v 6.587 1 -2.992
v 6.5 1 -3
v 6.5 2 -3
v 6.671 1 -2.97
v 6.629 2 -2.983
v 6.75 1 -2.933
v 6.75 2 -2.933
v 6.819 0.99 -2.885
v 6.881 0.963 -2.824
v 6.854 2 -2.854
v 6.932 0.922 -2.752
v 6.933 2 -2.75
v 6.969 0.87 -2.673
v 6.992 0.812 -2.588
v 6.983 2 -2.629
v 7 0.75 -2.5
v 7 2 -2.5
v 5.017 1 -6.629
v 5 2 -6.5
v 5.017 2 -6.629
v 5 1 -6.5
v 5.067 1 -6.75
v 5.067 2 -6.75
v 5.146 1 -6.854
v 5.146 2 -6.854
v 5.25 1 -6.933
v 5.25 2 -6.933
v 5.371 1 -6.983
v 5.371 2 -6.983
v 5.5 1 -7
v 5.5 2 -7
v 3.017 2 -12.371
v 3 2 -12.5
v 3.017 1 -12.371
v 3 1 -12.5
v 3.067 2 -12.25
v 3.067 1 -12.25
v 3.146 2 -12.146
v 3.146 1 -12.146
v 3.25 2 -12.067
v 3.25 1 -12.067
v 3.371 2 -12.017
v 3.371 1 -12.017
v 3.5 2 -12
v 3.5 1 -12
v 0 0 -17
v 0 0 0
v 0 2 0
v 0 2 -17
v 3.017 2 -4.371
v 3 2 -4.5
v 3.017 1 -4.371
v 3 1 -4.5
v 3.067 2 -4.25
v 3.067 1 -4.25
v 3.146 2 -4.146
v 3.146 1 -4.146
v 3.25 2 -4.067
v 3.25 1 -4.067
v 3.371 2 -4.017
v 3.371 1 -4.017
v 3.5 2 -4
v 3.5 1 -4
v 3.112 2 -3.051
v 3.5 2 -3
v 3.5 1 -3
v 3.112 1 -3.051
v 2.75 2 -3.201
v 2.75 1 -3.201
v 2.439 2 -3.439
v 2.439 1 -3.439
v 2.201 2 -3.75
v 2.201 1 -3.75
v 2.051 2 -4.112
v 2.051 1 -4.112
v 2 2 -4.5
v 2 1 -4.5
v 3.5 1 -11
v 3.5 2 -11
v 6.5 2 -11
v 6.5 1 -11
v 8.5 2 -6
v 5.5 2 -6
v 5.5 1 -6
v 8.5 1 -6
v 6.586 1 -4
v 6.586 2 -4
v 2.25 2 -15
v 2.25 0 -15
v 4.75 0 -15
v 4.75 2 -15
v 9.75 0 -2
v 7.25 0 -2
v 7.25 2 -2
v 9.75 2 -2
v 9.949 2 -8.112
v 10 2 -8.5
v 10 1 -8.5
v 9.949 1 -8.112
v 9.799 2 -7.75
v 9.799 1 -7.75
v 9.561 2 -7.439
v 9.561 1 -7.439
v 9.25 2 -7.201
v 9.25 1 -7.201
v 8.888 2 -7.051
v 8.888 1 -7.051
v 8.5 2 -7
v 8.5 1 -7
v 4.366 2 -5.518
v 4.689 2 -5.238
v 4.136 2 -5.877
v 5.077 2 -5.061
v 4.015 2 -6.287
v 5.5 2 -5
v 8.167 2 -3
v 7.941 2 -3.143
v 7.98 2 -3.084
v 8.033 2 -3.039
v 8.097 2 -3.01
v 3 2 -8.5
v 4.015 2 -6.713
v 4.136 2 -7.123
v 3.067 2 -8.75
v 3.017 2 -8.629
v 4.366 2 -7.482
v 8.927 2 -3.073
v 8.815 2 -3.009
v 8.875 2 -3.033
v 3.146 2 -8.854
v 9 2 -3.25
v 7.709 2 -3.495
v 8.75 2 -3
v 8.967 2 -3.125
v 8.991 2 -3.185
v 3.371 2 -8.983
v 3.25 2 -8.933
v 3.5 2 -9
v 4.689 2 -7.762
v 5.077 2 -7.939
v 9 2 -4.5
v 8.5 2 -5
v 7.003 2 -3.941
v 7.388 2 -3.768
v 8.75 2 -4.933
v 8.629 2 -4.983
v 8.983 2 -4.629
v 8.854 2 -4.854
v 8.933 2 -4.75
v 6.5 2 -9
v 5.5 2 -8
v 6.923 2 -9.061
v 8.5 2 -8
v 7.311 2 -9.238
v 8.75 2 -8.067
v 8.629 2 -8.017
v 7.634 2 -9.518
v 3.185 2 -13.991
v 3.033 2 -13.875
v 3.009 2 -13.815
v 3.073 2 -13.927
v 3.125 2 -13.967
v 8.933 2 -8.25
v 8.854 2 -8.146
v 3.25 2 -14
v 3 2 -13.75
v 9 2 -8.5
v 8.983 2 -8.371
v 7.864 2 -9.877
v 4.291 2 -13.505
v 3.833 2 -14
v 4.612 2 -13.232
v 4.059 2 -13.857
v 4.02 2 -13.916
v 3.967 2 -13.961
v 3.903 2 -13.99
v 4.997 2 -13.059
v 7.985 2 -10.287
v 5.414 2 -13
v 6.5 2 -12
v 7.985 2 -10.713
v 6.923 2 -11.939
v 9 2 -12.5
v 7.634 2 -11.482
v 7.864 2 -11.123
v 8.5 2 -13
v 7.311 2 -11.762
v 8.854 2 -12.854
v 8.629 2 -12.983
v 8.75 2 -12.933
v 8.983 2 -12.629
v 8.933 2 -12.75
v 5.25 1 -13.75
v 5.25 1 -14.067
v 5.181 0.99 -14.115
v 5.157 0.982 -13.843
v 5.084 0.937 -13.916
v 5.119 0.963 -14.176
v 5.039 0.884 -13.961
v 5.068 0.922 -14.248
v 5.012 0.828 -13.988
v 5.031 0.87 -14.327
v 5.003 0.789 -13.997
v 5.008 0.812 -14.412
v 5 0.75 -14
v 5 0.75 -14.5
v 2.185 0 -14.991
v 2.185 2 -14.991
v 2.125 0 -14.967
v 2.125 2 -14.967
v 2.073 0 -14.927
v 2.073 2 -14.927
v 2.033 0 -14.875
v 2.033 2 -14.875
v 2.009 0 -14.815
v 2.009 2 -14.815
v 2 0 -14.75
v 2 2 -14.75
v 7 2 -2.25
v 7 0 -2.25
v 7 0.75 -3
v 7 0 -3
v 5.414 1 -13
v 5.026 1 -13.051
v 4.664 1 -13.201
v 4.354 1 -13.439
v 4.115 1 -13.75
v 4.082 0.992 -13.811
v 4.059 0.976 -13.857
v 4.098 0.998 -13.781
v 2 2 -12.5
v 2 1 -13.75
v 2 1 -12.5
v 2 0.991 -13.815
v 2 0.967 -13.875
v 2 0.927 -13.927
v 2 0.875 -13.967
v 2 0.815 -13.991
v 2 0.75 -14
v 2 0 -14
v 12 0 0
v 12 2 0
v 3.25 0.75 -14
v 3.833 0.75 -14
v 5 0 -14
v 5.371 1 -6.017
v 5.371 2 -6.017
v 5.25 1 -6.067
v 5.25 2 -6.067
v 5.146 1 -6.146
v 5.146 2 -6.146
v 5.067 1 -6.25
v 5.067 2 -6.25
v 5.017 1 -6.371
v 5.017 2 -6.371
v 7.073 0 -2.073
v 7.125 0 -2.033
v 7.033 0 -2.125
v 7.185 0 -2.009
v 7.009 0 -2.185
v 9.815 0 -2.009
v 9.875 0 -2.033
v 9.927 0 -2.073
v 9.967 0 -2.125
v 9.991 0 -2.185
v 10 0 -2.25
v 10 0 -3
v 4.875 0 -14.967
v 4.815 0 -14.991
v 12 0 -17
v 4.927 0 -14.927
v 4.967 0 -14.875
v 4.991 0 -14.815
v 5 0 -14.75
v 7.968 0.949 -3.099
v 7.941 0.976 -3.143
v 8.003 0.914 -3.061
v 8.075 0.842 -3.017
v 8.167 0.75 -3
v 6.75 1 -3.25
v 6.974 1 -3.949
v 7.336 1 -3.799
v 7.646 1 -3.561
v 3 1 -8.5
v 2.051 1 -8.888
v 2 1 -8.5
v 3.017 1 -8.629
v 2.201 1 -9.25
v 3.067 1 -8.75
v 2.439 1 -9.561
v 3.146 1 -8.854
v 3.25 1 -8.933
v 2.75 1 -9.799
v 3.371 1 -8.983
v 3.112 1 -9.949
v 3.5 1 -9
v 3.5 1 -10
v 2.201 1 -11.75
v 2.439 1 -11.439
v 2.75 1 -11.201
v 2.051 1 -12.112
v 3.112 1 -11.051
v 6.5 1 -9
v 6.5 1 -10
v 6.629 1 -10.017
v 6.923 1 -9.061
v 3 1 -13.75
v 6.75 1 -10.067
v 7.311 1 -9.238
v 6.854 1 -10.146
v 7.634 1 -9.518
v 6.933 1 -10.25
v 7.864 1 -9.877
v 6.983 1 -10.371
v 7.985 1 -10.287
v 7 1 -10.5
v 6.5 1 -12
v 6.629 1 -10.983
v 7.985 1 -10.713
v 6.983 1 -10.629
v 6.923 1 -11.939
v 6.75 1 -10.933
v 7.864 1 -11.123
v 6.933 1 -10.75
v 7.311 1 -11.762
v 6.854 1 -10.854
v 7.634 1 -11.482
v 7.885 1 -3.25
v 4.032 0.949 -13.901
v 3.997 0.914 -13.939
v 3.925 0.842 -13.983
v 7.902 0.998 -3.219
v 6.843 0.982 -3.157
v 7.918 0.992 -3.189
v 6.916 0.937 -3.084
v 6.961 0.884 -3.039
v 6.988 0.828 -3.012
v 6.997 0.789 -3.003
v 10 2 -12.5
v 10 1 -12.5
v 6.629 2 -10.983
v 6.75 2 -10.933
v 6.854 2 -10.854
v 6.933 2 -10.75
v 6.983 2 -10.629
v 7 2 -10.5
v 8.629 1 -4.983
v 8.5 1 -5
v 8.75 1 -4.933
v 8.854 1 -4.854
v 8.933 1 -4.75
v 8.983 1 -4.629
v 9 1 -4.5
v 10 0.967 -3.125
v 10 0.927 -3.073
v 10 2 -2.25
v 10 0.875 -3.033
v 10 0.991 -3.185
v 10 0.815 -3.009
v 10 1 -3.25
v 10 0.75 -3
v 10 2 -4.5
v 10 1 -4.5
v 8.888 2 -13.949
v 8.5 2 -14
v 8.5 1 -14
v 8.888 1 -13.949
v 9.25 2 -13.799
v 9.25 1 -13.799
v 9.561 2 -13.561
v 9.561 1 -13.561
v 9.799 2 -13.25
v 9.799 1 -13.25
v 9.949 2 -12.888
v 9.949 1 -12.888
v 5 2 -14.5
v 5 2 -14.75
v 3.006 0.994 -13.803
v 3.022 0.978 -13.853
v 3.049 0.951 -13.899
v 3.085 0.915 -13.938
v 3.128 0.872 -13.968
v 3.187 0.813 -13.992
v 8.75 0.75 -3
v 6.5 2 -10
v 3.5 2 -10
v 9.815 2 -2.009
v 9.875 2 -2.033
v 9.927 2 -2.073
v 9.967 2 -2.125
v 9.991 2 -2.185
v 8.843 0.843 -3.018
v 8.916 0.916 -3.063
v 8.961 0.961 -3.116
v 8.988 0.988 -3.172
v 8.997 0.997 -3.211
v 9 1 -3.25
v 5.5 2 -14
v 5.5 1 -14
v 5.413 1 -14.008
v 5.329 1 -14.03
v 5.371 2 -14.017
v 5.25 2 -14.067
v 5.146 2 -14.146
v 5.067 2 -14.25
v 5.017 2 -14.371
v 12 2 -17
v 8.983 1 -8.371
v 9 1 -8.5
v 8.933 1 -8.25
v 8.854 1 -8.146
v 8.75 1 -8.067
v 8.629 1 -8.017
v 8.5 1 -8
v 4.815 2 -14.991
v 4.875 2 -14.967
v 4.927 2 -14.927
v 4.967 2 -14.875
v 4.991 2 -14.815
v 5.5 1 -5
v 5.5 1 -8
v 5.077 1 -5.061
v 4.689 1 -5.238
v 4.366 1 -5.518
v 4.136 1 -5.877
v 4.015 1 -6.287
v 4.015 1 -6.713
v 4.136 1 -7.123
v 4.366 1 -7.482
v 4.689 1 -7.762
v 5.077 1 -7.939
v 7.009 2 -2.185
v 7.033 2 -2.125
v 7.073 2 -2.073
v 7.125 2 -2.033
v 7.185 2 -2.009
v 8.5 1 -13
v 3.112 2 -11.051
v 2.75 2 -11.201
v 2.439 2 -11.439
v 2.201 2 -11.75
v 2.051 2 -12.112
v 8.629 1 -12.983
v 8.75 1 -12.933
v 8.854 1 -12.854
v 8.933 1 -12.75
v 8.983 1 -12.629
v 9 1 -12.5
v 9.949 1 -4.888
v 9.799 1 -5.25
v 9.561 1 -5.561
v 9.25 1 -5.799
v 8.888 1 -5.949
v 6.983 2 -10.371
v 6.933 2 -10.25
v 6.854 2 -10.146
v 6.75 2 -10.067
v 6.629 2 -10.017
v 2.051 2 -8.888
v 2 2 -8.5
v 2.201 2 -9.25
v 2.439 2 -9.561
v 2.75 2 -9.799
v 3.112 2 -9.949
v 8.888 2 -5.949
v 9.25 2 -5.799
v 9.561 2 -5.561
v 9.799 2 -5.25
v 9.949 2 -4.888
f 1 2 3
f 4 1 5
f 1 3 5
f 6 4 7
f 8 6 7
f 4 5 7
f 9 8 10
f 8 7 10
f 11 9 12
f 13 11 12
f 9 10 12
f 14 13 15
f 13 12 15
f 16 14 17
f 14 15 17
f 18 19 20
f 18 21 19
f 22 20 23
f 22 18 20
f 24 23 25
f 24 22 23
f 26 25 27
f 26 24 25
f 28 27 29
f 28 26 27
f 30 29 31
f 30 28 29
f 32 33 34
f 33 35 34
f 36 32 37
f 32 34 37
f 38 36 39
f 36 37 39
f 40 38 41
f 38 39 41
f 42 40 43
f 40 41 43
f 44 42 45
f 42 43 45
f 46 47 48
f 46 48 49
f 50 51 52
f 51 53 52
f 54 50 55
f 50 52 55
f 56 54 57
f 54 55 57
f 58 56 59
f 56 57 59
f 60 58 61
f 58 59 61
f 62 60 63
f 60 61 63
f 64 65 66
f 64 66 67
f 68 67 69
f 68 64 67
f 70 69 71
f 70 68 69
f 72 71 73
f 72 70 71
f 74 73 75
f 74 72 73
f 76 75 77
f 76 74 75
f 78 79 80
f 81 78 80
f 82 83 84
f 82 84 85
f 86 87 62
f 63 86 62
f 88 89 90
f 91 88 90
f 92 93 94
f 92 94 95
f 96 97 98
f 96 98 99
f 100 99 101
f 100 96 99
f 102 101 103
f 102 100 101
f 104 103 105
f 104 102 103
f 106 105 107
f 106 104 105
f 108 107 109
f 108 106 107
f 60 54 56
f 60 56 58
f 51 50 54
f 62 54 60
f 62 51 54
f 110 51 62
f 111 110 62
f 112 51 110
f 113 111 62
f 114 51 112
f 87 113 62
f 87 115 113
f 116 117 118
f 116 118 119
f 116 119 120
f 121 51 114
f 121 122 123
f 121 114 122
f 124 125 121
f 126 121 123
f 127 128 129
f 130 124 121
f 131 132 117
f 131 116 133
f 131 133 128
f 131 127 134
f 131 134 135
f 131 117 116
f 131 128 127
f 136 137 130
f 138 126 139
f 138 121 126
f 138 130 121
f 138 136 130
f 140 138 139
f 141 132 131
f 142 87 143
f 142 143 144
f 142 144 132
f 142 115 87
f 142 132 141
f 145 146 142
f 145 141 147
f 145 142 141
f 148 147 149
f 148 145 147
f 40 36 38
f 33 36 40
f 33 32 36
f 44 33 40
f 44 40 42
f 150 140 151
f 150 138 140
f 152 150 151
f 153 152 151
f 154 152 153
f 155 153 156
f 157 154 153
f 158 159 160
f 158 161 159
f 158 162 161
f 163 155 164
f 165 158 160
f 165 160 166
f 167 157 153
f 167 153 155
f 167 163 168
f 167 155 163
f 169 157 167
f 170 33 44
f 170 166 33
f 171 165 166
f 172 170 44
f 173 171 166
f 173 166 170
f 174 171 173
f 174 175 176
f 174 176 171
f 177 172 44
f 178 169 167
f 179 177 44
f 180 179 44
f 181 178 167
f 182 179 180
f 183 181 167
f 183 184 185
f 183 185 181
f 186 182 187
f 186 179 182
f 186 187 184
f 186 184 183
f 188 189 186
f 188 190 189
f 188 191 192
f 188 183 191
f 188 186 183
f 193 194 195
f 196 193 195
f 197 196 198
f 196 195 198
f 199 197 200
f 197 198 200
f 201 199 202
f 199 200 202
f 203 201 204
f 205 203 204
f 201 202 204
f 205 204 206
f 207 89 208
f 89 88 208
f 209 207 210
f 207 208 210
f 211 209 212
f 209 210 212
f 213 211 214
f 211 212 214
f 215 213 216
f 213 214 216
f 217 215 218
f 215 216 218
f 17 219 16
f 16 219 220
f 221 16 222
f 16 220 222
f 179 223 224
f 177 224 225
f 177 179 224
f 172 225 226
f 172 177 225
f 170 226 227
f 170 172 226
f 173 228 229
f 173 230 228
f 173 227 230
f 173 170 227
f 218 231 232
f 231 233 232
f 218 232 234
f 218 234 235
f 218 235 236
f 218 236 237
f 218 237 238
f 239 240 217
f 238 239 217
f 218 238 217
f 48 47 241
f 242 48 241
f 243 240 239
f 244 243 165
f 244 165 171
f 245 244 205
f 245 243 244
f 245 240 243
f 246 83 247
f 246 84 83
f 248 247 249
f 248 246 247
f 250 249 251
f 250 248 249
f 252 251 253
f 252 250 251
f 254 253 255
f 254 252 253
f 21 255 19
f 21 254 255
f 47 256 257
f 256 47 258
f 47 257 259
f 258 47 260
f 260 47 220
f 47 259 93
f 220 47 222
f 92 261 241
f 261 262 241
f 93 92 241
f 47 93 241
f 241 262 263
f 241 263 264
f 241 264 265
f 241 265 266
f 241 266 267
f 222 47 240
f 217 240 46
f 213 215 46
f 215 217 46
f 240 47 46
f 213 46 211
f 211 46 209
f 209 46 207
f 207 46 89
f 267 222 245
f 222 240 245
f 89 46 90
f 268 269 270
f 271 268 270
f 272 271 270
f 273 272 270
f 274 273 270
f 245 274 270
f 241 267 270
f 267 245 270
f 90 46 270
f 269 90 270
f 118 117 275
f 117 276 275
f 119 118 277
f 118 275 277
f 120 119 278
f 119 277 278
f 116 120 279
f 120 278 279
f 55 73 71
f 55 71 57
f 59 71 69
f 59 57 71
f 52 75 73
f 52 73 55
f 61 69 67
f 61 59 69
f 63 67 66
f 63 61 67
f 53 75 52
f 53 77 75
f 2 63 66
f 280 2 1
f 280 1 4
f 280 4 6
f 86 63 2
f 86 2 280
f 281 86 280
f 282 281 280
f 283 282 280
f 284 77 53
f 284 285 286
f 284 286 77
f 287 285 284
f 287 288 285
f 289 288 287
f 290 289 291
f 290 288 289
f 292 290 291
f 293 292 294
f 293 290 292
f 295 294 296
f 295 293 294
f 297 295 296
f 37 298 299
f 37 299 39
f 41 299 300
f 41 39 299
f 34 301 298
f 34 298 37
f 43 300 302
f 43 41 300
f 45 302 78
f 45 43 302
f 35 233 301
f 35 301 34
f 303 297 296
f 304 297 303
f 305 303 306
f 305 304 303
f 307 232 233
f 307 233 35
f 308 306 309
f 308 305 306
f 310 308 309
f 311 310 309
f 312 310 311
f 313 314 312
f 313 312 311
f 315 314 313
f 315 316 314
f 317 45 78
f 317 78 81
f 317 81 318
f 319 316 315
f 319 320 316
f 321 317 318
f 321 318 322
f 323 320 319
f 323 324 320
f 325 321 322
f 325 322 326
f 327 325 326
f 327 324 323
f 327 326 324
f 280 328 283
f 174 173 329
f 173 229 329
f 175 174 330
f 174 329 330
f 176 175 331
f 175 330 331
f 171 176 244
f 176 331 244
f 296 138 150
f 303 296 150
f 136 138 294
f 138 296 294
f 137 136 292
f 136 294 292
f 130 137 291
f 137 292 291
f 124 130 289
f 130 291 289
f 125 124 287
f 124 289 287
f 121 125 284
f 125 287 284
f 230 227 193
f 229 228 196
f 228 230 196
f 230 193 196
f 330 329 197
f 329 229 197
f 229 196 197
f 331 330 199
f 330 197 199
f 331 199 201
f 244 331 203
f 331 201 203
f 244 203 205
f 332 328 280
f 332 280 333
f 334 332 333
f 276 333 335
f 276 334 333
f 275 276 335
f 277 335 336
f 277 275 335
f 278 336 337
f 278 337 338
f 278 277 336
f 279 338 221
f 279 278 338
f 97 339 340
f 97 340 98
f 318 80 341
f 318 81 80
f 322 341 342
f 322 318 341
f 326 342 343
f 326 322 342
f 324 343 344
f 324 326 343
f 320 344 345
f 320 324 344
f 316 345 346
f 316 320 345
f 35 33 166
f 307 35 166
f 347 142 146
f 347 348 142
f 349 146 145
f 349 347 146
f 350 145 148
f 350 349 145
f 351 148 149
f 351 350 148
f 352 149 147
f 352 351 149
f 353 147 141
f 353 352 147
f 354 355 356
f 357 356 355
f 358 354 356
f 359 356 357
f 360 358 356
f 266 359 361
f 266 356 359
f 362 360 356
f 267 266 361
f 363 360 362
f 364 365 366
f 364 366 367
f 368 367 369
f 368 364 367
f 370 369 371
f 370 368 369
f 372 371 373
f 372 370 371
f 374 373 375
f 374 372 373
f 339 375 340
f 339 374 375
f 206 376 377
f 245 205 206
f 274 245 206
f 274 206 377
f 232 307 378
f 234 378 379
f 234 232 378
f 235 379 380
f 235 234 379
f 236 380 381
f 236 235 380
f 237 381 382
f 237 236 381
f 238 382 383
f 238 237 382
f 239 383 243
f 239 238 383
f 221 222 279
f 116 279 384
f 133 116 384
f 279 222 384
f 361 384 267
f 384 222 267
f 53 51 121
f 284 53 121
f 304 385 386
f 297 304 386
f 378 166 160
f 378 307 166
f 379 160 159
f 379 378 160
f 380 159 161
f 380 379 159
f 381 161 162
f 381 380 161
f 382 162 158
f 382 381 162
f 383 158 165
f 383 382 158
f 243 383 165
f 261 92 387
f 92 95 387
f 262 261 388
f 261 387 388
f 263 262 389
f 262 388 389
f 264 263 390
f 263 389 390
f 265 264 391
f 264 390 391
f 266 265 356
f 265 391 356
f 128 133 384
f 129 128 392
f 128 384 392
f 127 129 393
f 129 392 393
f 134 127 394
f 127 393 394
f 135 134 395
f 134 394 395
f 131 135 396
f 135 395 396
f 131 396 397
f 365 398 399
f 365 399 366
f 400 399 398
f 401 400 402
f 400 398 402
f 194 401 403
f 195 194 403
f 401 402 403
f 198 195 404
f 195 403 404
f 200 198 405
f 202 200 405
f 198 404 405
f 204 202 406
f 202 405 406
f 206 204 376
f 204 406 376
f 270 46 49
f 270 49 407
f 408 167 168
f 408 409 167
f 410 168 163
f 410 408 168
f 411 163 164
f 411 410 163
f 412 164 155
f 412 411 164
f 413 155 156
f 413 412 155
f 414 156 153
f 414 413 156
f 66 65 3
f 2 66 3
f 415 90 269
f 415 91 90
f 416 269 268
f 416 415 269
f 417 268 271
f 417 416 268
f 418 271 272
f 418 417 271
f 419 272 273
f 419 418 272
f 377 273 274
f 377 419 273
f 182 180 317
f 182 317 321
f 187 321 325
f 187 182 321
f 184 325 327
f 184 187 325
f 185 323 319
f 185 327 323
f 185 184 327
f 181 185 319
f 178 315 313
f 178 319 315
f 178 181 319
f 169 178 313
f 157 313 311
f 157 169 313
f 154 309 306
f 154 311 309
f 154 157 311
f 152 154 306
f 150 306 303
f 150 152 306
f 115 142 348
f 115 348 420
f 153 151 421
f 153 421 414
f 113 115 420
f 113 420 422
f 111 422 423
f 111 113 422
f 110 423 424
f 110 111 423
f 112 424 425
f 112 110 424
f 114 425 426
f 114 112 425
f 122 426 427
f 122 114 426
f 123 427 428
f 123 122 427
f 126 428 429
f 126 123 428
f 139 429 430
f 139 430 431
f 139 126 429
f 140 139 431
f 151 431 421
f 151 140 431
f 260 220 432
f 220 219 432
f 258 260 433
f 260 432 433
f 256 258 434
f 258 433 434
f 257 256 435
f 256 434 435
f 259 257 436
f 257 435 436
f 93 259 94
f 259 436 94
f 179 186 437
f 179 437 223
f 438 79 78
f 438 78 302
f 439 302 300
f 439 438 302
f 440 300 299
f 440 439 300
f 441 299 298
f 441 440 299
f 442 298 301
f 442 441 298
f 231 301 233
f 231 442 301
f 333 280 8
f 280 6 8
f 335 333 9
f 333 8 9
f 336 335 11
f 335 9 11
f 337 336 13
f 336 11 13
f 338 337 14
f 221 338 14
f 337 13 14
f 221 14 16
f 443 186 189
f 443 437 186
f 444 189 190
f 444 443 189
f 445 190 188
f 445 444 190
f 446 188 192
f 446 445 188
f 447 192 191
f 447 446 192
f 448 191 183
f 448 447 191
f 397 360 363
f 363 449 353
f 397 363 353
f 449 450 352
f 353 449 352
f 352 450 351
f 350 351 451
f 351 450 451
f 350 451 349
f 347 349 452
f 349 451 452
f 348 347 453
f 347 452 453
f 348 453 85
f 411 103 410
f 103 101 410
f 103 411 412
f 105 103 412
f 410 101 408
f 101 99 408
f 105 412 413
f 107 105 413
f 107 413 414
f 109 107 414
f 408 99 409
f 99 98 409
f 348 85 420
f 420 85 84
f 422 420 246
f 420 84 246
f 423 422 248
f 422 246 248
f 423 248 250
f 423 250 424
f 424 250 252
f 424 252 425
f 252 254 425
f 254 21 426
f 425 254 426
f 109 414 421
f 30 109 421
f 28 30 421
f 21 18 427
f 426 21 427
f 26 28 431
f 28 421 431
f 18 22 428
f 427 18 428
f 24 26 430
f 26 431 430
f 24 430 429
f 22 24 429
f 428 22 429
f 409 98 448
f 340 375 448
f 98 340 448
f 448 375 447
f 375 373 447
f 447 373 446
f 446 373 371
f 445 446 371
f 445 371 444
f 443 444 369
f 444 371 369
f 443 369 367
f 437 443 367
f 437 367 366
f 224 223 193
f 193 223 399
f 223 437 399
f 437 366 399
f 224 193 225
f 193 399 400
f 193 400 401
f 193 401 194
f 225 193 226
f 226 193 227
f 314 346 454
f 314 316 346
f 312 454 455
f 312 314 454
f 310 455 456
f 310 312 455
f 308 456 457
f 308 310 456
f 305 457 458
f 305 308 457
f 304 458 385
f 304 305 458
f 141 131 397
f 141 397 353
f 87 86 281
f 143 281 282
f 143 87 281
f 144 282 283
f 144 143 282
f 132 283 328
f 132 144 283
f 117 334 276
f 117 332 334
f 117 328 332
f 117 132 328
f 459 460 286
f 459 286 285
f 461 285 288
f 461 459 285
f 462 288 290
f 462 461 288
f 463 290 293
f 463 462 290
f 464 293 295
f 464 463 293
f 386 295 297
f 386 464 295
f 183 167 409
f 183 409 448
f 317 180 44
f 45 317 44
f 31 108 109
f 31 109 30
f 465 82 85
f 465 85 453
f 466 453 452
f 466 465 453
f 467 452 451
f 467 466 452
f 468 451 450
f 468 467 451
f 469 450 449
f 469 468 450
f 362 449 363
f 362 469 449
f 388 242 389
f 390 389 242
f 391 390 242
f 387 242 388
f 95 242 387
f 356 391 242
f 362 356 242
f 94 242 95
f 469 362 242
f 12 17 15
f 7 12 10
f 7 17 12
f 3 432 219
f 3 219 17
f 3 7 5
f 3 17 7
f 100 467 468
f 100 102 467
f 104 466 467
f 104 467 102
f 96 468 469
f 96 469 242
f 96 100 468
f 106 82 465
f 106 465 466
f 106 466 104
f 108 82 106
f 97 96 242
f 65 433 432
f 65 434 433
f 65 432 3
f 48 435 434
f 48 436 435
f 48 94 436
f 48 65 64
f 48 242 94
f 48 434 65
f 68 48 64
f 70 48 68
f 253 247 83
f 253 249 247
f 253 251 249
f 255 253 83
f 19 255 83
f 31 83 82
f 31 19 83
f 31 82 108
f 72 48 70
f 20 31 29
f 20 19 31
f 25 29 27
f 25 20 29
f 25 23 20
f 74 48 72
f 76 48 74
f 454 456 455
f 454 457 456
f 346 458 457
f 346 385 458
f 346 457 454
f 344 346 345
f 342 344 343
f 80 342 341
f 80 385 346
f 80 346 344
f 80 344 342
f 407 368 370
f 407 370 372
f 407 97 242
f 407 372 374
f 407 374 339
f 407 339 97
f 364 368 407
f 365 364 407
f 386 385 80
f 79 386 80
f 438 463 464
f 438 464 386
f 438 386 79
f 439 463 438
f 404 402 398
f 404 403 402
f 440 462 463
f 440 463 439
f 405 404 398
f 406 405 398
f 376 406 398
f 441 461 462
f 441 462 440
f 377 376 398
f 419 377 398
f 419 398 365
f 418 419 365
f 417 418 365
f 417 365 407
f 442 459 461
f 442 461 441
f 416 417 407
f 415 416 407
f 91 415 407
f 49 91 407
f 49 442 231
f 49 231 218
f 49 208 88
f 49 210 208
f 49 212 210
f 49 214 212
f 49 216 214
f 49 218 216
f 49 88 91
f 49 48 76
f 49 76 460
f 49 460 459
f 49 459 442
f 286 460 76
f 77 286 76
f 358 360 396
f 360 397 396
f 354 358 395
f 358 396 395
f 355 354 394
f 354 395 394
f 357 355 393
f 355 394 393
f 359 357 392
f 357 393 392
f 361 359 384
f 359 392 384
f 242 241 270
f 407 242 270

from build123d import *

# Parameters (mm, degrees)
SKIZZE1_W                            = 12
SKIZZE1_H                            = 17
AUFSATZ_LINEAR_AUSTRAGEN1_DEPTH      = 2
SCHNITT_LINEAR_AUSTRAGEN1_DEPTH      = 21.90454496
SCHNITT_LINEAR_AUSTRAGEN1_DEPTH_BACK = 21.90454496
SKIZZE4_W                            = 3
SKIZZE4_H                            = 1
SCHNITT_LINEAR_AUSTRAGEN3_DEPTH      = 1
VERRUNDUNG1_R                        = 0.5
VERRUNDUNG2_R                        = 1.5
VERRUNDUNG3_R                        = 0.25


# Some blends are built 0.0001 mm under size
with BuildPart() as part:
    # Skizze1 → Aufsatz-Linear austragen1 (new body)
    with BuildSketch(Plane(origin=(0, 0, 0), x_dir=(1, 0, 0), z_dir=(0, 1, 0))):
        with Locations((6, 8.5)):
            Rectangle(SKIZZE1_W, SKIZZE1_H)
    extrude(amount=AUFSATZ_LINEAR_AUSTRAGEN1_DEPTH)

    # Skizze4 → Schnitt-Linear austragen1 (cut, two sides: drawn at the far end of the back side and taken through both)
    with BuildSketch(Plane(origin=(0, 2, 0), x_dir=(1, 0, 0), z_dir=(0, 1, 0)).offset(-SCHNITT_LINEAR_AUSTRAGEN1_DEPTH_BACK)):
        with Locations((8.5, 2.5)):
            Rectangle(SKIZZE4_W, SKIZZE4_H)
        with Locations((3.5, 14.5)):
            Rectangle(SKIZZE4_W, SKIZZE4_H)
    extrude(amount=SCHNITT_LINEAR_AUSTRAGEN1_DEPTH + SCHNITT_LINEAR_AUSTRAGEN1_DEPTH_BACK, mode=Mode.SUBTRACT)

    # Skizze3 → Schnitt-Linear austragen3 (cut)
    with BuildSketch(Plane(origin=(0, 2, 0), x_dir=(1, 0, 0), z_dir=(0, 1, 0))):
        Polygon((8, 4), (3, 4), (3, 9), (8, 9), (8, 12), (3, 12), (3, 14), (2, 14), (2, 11), (7, 11), (7, 10), (2, 10), (2, 3), (8, 3), align=None)
        Polygon((9, 5), (4, 5), (4, 8), (9, 8), (9, 13), (4, 13), (4, 14), (10, 14), (10, 7), (5, 7), (5, 6), (10, 6), (10, 3), (9, 3), align=None)
    extrude(amount=-SCHNITT_LINEAR_AUSTRAGEN3_DEPTH, mode=Mode.SUBTRACT)

    # Verrundung1
    verrundung1_edges = [part.edges().sort_by_distance(p)[0] for p in [
        (3, 1.5, -12),
        (3, 1.5, -9),
        (7, 1.5, -3),
        (5, 1.5, -14),
        (9, 1.5, -5),
        (9, 1.5, -8),
        (9, 1.5, -13),
        (5, 1.5, -7),
        (5, 1.5, -6),
        (3, 1.5, -4),
        (7, 1.5, -10),
        (7, 1.5, -11),
    ]]
    fillet(verrundung1_edges, radius=VERRUNDUNG1_R - 0.0001)  # a hair under: the kernel refuses the full size

    # Verrundung2
    # the kernel refuses this fillet: 1.5 mm, written as the material it adds along each edge
    with BuildSketch(Plane(origin=(4, 2, -8), x_dir=(0, 0, 1), z_dir=(0, -1, 0)), Plane(origin=(2, 2, -11), x_dir=(1, 0, 0), z_dir=(0, -1, 0)), Plane(origin=(2, 2, -3), x_dir=(1, 0, 0), z_dir=(0, -1, 0)), Plane(origin=(2, 2, -10), x_dir=(0, 0, 1), z_dir=(0, -1, 0)), Plane(origin=(4, 2, -5), x_dir=(1, 0, 0), z_dir=(0, -1, 0))) as verrundung2_piece_1:
        with BuildLine():
            CenterArc((VERRUNDUNG2_R, -VERRUNDUNG2_R), VERRUNDUNG2_R, 90, 90)
            Line((0, -VERRUNDUNG2_R), (-VERRUNDUNG2_R * 0.02, -VERRUNDUNG2_R))
            Line((-VERRUNDUNG2_R * 0.02, -VERRUNDUNG2_R), (-VERRUNDUNG2_R * 0.02, VERRUNDUNG2_R * 0.02))
            Line((-VERRUNDUNG2_R * 0.02, VERRUNDUNG2_R * 0.02), (VERRUNDUNG2_R, VERRUNDUNG2_R * 0.02))
            Line((VERRUNDUNG2_R, VERRUNDUNG2_R * 0.02), (VERRUNDUNG2_R, 0))
        make_face()
    extrude(amount=1)
    with BuildSketch(Plane(origin=(8, 2, -4), x_dir=(-1, 0, 0), z_dir=(0, -1, 0)), Plane(origin=(4, 2, -13), x_dir=(1, 0, 0), z_dir=(0, -1, 0))) as verrundung2_piece_2:
        with BuildLine():
            CenterArc((1.414213562, -1.5), VERRUNDUNG2_R, 90, 70.528779366)
            Line((0, -1), (-0.028284271, -0.99))
            ThreePointArc((-0.028284271, -0.99), (-0.03, -0.5), (-0.03, 0))
            Line((-0.03, 0), (0, 0.03))
            Line((0, 0.03), (1.414213562, 0.03))
            Line((1.414213562, 0.03), (1.414213562, 0))
        make_face()
    extrude(amount=1)
    with BuildSketch(Plane(origin=(10, 2, -14), x_dir=(0, 0, 1), z_dir=(0, -1, 0)), Plane(origin=(10, 2, -7), x_dir=(-1, 0, 0), z_dir=(0, -1, 0)), Plane(origin=(10, 2, -6), x_dir=(0, 0, 1), z_dir=(0, -1, 0)), Plane(origin=(8, 2, -12), x_dir=(0, 0, 1), z_dir=(0, -1, 0)), Plane(origin=(8, 2, -9), x_dir=(-1, 0, 0), z_dir=(0, -1, 0))) as verrundung2_piece_3:
        with BuildLine():
            CenterArc((VERRUNDUNG2_R, VERRUNDUNG2_R), VERRUNDUNG2_R, 180, 90)
            Line((0, VERRUNDUNG2_R), (-VERRUNDUNG2_R * 0.02, VERRUNDUNG2_R))
            Line((-VERRUNDUNG2_R * 0.02, VERRUNDUNG2_R), (-VERRUNDUNG2_R * 0.02, -VERRUNDUNG2_R * 0.02))
            Line((-VERRUNDUNG2_R * 0.02, -VERRUNDUNG2_R * 0.02), (VERRUNDUNG2_R, -VERRUNDUNG2_R * 0.02))
            Line((VERRUNDUNG2_R, -VERRUNDUNG2_R * 0.02), (VERRUNDUNG2_R, 0))
        make_face()
    extrude(amount=1)

    # Verrundung3
    verrundung3_edges = [part.edges().sort_by_distance(p)[0] for p in [
        (3, 1.5, -14),
        (2.5, 1, -14),
        (5, 1, -14.24995),
        (7, 1, -2.75005),
        (10, 1, -2),
        (7, 1, -2),
        (2, 1, -15),
        (5, 1, -15),
        (4, 1.5, -14),
        (9, 1.5, -3),
        (4.5, 1, -14),
        (9.5, 1, -3),
        (7.5, 1, -3),
        (8, 1.5, -3),
    ]]
    fillet(verrundung3_edges, radius=VERRUNDUNG3_R)


solid = part.part
